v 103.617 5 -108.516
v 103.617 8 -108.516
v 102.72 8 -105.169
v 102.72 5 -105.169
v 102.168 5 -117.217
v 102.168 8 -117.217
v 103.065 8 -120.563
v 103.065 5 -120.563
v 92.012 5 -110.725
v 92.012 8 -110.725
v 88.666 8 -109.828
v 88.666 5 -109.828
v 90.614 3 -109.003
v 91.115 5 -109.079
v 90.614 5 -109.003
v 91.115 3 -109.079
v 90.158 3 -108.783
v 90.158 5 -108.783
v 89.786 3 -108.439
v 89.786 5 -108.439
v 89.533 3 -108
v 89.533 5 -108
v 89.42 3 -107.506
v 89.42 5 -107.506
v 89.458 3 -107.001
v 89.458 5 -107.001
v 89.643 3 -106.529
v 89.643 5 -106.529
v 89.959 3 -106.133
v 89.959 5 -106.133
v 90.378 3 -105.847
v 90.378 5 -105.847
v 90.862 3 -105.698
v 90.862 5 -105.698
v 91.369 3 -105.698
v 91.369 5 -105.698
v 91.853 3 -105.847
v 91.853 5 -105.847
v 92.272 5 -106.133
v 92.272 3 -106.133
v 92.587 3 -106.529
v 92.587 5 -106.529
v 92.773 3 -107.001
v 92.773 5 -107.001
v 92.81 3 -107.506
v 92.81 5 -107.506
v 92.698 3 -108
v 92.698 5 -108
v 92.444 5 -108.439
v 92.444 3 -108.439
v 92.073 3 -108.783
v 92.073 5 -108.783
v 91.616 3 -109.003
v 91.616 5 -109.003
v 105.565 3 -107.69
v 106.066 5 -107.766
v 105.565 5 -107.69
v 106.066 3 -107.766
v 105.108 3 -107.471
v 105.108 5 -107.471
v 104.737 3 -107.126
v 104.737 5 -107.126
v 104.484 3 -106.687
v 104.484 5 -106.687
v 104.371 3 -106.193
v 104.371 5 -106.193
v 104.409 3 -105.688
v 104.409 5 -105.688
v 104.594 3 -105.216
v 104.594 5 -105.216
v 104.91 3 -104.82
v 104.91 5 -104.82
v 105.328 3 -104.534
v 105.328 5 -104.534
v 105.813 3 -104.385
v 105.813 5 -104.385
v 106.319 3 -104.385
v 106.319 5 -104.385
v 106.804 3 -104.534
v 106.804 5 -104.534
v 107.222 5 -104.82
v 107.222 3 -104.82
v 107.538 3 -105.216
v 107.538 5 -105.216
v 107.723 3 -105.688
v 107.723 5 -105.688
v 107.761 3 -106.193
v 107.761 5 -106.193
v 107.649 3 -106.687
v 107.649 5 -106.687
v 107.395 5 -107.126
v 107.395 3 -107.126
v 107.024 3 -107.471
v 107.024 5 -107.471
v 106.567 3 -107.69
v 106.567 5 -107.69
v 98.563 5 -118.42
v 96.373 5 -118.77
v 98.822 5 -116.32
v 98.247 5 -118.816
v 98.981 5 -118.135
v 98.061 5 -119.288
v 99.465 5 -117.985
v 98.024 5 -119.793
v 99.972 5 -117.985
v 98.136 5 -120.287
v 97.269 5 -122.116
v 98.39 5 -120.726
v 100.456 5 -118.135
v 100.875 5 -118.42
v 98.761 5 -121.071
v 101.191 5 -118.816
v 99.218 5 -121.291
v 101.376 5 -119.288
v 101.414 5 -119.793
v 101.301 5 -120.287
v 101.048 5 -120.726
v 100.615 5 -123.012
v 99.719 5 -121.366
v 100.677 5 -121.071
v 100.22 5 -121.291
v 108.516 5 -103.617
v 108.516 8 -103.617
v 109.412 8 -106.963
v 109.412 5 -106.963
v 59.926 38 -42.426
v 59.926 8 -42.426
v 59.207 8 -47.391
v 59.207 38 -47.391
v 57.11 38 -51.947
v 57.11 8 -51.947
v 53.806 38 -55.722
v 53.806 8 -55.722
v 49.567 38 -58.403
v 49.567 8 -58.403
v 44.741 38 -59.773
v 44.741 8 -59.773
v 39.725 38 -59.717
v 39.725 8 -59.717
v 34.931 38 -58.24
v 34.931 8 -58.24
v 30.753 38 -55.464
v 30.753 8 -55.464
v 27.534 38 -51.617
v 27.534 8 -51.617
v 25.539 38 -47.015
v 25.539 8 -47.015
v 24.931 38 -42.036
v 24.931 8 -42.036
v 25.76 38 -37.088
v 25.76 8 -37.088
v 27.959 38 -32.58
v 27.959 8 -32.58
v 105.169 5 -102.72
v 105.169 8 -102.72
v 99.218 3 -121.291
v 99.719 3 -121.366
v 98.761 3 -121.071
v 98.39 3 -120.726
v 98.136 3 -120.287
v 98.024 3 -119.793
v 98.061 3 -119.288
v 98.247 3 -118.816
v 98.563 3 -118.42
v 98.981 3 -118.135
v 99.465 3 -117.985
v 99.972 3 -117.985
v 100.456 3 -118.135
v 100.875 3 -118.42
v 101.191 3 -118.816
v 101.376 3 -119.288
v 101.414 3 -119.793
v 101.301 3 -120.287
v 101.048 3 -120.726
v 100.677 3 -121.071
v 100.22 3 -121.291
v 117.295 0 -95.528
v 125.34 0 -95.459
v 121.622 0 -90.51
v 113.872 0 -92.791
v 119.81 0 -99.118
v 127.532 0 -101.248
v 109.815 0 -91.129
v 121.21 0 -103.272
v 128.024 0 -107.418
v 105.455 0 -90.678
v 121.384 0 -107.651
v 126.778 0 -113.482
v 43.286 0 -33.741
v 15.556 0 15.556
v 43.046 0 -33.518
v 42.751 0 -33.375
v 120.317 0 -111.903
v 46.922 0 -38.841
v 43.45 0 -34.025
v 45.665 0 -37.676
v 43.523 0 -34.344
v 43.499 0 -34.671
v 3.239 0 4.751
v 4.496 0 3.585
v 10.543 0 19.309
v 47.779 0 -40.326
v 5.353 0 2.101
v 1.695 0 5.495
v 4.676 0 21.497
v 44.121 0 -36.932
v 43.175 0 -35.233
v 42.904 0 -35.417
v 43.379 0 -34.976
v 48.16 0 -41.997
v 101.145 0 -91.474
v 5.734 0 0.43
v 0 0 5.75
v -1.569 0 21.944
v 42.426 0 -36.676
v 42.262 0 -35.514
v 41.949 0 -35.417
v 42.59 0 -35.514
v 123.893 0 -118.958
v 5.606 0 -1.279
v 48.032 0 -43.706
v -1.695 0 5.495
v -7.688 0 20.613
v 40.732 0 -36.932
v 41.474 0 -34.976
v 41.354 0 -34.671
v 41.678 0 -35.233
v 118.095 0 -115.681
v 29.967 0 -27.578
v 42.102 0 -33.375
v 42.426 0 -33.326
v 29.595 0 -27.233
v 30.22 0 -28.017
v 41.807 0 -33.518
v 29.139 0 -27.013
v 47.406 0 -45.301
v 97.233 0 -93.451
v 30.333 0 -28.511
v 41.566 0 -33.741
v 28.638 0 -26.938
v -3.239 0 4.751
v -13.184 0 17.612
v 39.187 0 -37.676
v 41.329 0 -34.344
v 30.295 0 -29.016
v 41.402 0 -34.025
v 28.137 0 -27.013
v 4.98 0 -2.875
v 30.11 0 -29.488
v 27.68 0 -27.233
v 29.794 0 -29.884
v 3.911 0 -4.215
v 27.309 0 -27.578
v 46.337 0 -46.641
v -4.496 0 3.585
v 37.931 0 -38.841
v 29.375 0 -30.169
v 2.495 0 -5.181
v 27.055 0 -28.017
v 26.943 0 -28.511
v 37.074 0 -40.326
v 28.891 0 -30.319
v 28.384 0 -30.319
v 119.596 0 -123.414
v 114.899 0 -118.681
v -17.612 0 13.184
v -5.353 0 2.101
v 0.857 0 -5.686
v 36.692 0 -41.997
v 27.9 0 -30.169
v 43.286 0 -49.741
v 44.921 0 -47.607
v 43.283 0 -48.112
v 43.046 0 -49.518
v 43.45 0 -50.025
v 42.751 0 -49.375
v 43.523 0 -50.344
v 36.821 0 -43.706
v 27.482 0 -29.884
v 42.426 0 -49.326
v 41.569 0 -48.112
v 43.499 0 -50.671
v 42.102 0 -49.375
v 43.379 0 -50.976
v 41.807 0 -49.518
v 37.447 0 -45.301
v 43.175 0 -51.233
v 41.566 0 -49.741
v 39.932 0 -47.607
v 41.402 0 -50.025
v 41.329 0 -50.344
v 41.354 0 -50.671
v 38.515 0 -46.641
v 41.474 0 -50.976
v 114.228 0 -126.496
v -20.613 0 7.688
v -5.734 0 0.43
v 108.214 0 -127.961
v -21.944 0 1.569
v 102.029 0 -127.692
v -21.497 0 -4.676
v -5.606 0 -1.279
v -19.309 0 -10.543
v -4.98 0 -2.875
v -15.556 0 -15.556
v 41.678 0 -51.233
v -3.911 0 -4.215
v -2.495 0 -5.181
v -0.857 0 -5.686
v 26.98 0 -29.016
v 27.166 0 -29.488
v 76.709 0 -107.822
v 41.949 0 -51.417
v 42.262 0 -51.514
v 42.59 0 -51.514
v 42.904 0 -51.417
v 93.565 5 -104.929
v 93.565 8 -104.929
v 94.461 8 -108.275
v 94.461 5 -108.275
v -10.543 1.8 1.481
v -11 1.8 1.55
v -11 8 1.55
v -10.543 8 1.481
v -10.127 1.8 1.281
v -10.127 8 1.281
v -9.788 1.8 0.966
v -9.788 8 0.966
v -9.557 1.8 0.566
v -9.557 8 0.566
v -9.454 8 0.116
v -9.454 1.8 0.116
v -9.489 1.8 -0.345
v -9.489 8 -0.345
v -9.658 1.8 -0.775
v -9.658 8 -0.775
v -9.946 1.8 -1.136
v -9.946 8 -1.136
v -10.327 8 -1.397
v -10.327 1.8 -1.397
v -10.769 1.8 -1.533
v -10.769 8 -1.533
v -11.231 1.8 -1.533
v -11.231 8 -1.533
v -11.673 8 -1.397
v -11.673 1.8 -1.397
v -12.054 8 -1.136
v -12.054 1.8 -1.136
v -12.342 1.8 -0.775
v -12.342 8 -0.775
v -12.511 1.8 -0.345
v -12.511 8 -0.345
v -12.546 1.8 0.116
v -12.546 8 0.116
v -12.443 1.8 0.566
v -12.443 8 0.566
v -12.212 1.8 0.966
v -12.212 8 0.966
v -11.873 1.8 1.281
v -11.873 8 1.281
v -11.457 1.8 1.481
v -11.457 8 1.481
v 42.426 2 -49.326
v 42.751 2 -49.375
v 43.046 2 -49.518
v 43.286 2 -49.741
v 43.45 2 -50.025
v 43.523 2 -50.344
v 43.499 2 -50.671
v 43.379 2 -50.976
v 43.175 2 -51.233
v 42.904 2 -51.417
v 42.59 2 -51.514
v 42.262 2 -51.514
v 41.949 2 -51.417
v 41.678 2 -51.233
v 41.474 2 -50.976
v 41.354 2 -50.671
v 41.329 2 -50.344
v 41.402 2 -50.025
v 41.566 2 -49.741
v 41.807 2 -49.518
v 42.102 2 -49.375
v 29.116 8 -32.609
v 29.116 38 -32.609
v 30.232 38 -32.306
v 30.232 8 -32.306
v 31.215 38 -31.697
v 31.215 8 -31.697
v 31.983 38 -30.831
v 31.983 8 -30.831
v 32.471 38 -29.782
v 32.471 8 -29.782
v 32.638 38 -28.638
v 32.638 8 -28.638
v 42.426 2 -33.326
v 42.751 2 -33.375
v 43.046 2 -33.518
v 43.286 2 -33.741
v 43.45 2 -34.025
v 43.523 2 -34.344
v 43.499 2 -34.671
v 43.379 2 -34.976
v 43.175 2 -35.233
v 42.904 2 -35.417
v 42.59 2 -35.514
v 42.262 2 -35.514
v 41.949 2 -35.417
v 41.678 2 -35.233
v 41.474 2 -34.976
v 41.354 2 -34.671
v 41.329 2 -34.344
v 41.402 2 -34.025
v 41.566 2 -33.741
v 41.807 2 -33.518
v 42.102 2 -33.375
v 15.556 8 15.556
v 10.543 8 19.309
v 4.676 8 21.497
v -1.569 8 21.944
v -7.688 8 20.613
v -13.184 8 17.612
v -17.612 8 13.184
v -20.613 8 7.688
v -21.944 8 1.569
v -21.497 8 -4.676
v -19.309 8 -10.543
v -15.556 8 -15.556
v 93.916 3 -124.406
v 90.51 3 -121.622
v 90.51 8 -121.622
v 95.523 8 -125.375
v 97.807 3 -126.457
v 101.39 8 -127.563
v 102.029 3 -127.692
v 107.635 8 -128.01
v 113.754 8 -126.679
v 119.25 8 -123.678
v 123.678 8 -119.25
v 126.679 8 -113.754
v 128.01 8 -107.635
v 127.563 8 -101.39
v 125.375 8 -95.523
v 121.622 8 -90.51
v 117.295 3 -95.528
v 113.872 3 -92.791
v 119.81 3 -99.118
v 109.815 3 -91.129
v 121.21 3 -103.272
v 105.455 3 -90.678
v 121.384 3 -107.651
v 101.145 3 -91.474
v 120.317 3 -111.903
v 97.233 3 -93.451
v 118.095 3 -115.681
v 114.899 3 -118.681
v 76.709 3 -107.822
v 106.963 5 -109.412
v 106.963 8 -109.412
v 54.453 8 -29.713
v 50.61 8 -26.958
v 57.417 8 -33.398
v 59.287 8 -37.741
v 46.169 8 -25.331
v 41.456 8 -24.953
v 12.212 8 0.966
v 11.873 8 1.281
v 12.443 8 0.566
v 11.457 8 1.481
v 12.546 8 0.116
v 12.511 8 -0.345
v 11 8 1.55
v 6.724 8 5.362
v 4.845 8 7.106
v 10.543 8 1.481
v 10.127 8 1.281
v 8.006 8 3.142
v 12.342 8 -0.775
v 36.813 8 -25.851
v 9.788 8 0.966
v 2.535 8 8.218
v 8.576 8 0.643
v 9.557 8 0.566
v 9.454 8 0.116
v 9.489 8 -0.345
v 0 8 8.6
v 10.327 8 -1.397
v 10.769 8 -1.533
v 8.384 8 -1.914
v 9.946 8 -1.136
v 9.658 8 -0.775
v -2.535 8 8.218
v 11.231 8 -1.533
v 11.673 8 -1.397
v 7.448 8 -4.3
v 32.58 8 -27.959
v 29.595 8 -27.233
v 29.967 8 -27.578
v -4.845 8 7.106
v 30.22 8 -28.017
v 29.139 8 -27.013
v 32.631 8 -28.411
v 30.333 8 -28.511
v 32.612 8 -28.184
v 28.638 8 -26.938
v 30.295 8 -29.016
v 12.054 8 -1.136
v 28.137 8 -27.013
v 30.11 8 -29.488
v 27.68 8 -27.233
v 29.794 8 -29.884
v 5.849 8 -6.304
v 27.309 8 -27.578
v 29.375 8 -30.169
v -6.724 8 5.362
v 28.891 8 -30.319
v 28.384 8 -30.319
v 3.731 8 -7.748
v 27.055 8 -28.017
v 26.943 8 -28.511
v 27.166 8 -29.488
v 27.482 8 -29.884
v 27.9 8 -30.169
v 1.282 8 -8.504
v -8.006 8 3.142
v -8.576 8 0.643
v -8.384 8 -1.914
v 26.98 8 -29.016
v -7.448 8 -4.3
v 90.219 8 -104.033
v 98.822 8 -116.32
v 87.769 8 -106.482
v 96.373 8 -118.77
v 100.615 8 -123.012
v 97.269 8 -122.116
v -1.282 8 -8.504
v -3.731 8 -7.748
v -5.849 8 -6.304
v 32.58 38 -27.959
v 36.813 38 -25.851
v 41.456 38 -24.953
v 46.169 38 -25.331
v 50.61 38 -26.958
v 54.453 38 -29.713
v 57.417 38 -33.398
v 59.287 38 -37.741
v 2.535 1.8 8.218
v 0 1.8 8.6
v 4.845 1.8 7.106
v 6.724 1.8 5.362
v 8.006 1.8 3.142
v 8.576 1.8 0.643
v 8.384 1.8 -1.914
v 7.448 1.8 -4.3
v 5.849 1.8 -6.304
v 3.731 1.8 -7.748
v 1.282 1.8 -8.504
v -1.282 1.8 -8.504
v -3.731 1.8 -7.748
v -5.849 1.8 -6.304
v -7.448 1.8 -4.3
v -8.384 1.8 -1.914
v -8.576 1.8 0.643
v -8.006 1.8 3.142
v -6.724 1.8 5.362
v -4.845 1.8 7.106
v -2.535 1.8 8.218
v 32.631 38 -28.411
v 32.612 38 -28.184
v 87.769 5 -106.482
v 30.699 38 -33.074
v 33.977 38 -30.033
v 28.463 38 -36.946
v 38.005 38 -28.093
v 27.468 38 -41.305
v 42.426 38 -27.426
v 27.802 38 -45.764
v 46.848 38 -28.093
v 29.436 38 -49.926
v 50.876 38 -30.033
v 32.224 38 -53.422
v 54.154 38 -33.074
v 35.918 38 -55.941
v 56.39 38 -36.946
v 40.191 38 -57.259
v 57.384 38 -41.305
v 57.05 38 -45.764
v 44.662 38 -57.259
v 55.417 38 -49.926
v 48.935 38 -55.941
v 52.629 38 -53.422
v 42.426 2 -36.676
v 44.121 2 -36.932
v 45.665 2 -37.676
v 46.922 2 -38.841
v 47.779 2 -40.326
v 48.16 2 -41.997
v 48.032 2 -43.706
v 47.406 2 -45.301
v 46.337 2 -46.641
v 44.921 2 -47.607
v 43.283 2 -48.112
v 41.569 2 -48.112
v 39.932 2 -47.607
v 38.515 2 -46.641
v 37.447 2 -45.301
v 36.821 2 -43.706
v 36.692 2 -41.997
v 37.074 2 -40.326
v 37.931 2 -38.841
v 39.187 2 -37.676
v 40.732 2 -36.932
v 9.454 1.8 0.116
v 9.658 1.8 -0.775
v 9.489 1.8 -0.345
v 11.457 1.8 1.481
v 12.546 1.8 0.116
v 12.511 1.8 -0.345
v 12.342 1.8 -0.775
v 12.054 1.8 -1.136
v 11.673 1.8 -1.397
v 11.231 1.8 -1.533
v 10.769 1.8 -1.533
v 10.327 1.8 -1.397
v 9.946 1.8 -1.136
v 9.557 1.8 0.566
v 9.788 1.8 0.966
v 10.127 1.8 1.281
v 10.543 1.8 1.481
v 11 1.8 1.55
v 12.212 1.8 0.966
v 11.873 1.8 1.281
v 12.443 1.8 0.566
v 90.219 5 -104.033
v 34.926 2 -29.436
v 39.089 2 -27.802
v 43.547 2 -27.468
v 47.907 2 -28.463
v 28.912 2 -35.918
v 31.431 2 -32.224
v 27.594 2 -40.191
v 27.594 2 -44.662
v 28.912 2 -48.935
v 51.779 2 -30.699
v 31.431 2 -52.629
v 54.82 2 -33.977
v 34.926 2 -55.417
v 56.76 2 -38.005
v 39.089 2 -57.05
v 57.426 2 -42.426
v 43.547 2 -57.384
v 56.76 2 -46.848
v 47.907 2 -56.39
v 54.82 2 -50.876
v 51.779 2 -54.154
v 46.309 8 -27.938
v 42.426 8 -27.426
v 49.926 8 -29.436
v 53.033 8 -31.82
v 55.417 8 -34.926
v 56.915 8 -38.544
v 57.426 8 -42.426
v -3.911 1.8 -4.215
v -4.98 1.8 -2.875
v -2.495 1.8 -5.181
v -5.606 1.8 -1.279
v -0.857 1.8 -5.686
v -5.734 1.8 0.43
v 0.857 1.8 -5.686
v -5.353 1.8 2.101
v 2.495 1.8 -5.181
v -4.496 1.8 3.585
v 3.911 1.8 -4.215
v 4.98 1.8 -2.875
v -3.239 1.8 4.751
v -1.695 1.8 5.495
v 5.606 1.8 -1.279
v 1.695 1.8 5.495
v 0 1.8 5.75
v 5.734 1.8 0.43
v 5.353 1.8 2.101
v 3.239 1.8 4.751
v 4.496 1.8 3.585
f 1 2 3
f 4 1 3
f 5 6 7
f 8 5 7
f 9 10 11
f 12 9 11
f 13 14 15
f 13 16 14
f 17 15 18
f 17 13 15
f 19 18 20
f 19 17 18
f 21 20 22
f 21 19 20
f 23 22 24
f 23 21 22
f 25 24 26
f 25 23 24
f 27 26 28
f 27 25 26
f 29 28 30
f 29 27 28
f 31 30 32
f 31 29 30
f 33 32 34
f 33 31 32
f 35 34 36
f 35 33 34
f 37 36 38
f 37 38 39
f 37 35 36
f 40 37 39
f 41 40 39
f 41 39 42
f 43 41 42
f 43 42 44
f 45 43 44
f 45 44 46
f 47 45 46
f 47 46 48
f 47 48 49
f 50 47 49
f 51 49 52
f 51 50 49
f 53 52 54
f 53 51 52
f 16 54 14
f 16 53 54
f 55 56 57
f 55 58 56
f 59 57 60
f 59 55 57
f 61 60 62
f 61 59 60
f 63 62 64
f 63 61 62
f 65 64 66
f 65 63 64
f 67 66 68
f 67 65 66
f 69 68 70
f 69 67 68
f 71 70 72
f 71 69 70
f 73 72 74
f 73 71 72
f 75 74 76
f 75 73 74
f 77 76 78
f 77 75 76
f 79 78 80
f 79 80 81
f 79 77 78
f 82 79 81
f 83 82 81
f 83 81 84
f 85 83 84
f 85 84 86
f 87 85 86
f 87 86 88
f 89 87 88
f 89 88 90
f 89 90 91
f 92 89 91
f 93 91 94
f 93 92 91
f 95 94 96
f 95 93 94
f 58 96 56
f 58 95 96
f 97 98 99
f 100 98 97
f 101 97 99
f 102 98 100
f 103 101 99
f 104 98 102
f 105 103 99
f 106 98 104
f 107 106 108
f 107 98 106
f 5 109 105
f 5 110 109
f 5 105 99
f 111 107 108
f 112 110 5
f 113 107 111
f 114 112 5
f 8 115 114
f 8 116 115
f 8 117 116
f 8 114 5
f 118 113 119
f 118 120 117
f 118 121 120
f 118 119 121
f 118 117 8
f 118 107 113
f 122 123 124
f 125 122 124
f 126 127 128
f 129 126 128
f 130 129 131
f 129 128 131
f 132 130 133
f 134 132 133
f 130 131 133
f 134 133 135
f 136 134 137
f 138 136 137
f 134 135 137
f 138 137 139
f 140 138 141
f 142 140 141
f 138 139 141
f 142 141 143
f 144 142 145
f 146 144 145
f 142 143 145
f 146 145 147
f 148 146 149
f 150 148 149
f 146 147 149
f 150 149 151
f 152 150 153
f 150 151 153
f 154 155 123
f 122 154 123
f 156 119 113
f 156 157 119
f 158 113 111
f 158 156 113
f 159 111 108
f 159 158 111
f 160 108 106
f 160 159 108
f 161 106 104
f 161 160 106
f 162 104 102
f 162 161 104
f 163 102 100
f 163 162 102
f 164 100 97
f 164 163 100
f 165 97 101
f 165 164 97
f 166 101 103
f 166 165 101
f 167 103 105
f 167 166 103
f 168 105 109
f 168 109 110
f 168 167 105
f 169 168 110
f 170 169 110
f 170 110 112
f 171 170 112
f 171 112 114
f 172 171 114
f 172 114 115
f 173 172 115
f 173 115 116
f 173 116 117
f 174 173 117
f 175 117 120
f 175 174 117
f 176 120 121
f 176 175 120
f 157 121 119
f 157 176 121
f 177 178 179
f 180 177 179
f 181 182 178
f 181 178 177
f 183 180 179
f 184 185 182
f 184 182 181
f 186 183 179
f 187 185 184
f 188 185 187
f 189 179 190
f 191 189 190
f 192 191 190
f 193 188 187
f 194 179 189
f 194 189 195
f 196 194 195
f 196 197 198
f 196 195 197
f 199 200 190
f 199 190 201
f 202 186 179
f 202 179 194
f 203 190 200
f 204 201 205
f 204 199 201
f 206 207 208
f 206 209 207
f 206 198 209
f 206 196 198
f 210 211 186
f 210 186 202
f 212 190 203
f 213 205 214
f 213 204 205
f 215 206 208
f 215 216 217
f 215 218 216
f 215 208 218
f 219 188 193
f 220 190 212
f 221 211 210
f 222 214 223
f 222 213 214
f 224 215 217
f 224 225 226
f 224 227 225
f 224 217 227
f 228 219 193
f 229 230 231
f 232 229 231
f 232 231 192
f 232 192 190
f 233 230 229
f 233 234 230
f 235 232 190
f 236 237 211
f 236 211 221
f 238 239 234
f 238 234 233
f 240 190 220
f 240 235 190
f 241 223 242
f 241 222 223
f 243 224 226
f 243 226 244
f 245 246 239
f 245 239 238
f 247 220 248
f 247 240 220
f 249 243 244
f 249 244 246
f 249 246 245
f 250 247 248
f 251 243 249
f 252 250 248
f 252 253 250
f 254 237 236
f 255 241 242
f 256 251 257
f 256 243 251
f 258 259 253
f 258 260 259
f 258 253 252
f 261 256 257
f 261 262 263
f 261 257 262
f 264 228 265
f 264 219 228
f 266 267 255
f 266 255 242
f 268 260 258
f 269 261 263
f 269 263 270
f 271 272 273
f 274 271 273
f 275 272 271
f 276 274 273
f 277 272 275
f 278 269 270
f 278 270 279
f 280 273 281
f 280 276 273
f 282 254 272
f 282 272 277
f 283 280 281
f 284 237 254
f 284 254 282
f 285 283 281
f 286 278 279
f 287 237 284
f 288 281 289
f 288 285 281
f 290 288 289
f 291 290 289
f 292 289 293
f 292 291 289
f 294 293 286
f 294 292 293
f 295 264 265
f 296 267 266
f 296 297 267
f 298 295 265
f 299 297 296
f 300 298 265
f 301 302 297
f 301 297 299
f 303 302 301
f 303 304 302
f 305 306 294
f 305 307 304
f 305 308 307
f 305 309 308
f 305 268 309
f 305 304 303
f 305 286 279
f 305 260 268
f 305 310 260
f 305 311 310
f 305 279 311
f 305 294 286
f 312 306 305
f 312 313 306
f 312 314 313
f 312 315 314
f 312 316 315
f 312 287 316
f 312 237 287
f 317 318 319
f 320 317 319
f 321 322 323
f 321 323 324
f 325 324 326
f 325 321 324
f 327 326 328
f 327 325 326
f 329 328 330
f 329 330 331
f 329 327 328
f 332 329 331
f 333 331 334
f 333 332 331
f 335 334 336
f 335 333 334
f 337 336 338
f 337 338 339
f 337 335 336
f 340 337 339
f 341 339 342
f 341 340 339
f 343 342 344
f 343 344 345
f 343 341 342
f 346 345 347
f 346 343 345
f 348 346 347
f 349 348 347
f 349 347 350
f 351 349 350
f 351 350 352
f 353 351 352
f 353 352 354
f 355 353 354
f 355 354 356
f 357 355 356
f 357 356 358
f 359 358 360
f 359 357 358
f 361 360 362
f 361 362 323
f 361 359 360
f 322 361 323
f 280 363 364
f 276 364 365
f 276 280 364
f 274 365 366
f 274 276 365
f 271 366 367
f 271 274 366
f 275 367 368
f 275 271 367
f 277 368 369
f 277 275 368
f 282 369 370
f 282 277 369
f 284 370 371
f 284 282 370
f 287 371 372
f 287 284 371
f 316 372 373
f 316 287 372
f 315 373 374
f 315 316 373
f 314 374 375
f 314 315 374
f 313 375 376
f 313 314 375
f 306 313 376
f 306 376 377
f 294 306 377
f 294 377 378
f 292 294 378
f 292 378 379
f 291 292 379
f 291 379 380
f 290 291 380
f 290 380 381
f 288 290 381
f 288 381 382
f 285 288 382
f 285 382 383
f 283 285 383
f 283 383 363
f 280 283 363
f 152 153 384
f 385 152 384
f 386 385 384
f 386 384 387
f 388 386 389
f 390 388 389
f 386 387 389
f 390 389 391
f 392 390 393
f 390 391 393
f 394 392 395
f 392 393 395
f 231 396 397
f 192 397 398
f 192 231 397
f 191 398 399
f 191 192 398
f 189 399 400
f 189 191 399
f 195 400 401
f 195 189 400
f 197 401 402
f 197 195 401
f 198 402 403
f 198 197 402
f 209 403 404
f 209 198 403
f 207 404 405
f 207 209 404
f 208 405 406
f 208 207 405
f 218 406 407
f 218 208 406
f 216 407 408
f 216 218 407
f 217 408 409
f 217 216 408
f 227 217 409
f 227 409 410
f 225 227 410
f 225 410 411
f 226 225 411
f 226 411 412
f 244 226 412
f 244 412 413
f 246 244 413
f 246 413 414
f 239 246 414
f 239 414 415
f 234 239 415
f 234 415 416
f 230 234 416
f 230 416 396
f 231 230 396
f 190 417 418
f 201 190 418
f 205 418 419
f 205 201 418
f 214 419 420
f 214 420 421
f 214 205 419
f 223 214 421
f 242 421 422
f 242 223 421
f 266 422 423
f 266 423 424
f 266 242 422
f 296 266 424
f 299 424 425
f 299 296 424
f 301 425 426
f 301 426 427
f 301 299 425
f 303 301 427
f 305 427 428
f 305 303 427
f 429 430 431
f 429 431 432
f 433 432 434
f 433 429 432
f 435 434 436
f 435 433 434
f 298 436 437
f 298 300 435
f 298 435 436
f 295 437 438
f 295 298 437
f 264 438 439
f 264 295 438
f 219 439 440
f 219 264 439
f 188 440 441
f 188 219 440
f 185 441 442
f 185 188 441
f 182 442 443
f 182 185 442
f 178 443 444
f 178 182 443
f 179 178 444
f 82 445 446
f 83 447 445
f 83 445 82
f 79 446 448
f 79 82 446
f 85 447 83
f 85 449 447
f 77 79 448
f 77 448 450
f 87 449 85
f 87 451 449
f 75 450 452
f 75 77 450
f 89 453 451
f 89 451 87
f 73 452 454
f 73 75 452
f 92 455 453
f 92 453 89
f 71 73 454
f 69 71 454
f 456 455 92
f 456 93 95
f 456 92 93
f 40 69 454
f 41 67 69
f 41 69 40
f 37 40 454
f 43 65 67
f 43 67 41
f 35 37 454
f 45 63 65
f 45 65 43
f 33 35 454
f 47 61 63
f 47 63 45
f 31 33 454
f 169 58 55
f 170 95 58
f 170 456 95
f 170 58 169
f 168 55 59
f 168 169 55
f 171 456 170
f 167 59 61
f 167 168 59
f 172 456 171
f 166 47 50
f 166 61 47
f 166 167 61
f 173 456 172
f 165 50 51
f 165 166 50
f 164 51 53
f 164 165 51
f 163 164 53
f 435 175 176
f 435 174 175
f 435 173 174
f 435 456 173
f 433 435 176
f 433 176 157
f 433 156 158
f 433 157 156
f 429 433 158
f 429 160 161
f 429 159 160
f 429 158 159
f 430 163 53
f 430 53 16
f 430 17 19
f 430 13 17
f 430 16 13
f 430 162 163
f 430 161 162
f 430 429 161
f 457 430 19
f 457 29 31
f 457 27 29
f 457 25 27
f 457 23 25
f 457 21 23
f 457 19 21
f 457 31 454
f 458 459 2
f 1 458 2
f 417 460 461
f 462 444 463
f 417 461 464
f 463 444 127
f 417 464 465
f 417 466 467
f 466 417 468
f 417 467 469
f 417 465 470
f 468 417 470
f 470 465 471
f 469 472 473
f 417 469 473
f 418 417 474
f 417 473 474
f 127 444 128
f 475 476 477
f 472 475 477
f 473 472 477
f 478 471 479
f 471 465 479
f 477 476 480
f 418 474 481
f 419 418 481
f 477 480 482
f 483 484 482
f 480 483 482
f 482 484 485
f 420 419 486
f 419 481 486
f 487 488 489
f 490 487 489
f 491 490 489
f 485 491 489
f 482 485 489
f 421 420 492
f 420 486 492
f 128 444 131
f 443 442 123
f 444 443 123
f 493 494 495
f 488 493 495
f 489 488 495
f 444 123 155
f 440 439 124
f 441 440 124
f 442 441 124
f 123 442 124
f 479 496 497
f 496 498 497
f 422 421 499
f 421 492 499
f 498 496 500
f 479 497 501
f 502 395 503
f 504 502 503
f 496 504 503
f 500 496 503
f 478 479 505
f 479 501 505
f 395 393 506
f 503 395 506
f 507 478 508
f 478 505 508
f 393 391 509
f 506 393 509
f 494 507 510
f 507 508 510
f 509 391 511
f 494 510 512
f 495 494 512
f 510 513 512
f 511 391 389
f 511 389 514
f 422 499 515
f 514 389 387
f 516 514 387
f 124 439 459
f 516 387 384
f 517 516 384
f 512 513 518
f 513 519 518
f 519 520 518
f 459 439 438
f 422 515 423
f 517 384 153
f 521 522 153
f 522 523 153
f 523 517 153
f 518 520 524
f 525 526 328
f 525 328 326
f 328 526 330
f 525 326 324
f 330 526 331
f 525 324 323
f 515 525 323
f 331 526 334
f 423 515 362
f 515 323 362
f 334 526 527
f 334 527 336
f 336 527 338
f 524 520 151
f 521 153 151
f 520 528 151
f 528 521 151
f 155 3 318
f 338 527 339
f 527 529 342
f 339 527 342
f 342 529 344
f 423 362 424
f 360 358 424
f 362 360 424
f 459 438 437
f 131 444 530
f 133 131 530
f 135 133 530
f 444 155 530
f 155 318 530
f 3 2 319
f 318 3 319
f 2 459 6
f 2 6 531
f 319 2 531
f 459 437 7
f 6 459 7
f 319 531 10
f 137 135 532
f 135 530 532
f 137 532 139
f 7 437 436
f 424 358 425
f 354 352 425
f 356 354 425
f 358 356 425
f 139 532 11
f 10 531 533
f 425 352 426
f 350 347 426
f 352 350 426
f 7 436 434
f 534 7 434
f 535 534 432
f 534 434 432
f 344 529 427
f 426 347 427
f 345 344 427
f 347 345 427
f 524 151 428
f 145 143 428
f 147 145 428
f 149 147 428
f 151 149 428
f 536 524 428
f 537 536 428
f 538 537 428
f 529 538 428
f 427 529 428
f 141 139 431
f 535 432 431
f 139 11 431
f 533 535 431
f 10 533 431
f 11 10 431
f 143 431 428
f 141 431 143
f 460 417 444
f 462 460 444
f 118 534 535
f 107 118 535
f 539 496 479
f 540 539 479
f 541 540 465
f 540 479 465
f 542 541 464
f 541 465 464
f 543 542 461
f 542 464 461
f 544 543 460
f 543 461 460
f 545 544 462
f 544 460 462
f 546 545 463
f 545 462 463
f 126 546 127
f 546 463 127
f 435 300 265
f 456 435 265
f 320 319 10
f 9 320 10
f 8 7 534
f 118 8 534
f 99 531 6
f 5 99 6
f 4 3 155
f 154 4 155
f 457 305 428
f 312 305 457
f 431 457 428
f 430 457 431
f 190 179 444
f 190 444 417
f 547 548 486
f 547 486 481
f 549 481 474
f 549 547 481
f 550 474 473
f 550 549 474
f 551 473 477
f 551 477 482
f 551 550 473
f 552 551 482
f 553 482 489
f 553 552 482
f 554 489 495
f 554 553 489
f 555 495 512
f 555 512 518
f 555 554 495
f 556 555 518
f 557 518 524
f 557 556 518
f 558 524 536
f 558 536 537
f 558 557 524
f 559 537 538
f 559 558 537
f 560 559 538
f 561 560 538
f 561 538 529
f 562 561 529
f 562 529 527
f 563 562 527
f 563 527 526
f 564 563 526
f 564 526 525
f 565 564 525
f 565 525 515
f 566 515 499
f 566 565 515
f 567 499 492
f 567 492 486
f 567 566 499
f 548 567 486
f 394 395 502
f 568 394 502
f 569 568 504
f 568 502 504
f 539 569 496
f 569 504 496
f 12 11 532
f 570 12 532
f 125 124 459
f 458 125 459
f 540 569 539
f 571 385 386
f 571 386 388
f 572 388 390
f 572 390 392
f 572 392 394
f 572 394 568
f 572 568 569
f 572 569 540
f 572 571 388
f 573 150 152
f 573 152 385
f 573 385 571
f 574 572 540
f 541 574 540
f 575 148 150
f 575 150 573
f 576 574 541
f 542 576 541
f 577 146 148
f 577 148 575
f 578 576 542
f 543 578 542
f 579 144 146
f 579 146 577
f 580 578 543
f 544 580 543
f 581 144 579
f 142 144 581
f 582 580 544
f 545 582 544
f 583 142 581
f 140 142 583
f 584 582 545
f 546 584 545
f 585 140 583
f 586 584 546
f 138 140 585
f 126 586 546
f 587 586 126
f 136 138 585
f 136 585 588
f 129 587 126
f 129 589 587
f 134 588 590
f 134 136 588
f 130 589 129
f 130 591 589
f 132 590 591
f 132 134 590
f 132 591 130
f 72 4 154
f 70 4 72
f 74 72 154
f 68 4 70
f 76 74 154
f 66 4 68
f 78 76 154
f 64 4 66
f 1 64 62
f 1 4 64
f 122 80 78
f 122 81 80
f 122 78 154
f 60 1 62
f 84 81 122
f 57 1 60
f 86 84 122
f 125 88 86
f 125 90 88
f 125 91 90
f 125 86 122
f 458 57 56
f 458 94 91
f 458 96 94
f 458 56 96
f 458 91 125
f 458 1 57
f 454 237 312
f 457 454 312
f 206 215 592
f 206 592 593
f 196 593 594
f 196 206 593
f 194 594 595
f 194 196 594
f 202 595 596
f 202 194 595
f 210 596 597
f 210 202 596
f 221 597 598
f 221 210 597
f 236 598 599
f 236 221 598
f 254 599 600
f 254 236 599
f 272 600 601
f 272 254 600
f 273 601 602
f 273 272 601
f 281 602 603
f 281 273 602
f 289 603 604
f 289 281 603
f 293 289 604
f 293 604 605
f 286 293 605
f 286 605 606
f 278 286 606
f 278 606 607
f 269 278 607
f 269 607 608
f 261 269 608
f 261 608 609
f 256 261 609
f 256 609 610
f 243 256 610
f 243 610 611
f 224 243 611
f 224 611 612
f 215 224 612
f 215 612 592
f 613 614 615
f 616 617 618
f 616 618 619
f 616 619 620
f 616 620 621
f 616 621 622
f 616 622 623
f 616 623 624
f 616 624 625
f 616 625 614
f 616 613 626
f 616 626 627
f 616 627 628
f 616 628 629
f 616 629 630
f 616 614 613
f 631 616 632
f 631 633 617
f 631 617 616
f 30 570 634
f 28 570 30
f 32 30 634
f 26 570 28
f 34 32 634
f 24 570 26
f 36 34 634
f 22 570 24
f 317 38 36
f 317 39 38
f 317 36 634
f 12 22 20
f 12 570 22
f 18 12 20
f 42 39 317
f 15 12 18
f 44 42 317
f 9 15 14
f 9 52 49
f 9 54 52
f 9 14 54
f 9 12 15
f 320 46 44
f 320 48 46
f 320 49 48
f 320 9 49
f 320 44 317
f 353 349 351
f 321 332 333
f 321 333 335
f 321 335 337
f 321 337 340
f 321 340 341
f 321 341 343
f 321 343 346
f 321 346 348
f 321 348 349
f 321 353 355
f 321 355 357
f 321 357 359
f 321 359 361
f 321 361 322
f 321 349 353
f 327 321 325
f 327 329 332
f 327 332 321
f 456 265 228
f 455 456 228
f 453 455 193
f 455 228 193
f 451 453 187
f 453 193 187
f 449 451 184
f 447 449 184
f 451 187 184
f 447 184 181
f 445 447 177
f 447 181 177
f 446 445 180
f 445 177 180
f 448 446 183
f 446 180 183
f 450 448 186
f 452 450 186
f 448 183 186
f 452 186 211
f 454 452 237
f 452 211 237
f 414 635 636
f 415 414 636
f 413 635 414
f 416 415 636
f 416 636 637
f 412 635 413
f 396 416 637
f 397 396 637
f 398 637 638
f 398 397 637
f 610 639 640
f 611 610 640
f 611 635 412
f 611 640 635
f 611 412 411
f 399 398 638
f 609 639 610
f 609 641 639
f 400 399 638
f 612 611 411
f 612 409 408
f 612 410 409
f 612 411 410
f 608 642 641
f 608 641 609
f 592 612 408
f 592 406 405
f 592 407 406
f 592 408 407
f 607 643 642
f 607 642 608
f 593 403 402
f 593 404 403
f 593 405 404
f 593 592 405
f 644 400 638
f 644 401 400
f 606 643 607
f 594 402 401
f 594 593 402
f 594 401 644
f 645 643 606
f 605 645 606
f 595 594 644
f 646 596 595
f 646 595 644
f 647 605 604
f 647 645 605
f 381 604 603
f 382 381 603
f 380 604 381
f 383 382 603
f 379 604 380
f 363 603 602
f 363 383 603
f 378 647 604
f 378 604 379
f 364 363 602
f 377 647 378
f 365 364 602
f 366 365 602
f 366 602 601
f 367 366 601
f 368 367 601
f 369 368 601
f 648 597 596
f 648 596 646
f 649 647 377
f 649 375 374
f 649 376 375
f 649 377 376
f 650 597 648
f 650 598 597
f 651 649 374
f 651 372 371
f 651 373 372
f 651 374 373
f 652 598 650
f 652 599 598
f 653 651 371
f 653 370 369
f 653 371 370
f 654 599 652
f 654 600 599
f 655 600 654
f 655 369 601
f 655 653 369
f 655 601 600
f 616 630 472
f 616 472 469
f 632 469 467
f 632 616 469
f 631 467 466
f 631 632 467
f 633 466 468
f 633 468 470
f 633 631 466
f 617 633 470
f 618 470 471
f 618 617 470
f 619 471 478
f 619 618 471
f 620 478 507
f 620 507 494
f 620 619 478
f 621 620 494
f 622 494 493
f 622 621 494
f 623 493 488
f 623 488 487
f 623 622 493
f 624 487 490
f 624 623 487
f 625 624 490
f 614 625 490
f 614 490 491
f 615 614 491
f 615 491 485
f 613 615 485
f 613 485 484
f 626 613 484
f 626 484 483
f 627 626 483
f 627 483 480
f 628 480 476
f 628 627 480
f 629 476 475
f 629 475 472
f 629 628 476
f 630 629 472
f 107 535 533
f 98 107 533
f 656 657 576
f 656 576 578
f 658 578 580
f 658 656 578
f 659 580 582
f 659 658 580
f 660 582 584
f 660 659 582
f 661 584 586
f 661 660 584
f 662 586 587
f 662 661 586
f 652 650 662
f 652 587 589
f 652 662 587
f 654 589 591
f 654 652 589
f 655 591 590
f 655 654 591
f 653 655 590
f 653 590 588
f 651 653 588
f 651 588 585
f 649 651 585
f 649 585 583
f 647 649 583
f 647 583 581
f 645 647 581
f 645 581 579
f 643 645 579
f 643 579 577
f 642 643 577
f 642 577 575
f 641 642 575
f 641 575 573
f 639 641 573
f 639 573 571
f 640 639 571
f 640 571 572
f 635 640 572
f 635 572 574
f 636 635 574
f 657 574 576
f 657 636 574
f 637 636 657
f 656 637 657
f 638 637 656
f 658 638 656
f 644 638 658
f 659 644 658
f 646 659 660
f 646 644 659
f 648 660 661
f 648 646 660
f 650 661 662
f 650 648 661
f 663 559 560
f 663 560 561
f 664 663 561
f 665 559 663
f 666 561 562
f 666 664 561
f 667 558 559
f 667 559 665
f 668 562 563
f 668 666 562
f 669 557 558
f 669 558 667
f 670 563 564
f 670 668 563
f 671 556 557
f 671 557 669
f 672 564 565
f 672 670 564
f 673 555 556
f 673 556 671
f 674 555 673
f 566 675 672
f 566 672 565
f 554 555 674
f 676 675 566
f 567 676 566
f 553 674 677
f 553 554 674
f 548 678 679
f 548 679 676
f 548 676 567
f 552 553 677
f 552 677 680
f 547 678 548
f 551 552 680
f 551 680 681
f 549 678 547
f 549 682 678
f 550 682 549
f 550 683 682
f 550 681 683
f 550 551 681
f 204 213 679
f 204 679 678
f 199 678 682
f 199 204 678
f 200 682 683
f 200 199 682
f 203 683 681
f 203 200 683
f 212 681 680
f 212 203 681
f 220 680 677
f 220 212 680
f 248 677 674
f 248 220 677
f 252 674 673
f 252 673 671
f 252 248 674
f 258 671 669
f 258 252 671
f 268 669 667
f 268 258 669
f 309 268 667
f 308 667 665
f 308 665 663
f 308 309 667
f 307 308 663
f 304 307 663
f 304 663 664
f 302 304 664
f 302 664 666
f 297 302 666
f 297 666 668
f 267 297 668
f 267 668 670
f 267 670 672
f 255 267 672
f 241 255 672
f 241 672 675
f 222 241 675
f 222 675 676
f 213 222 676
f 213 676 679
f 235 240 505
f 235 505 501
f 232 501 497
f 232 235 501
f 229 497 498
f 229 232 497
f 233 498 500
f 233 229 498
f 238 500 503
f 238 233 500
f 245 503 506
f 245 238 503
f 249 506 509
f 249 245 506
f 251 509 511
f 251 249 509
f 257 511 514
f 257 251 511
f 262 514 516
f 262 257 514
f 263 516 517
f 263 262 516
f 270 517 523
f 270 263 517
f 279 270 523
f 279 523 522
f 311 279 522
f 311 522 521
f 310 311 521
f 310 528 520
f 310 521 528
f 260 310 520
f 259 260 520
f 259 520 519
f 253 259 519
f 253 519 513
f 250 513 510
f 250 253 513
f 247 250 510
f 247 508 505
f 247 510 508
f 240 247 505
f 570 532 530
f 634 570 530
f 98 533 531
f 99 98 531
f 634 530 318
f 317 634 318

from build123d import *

# Parameters (mm, degrees)
BOSS_EXTRUDE1_DEPTH       = 8
BOSS_EXTRUDE3_START       = 8
SKETCH4_R                 = 15
BOSS_EXTRUDE3_DEPTH       = 30
CUT_EXTRUDE9_DEPTH        = 186.056233377
CUT_EXTRUDE9_DEPTH_BACK   = 186.056233377
SKETCH4_5_R               = 5.75
SKETCH4_5_R_2             = 1.1
SKETCH4_5_R_3             = 1.7
CUT_EXTRUDE5_START        = 8
SKETCH1_8_R               = 1.7
CUT_EXTRUDE5_DEPTH        = 3
CUT_EXTRUDE6_DEPTH        = 3
CUT_EXTRUDE11_START       = 1.8
SKETCH4_7_R               = 8.6
SKETCH4_7_R_2             = 5.75
SKETCH4_7_R_3             = 1.55
CUT_EXTRUDE11_DEPTH       = 6.2
CUT_EXTRUDE13_DEPTH       = 186.056233377
CUT_EXTRUDE13_DEPTH_BACK  = 186.056233377
SKETCH1_10_R              = 1.7
CUT_EXTRUDE14_START       = 2
CUT_EXTRUDE14_OUTLINE_R   = 15
CUT_EXTRUDE14_OUTLINE_R_2 = 1.1
CUT_EXTRUDE14_OUTLINE_R_3 = 5.75
CUT_EXTRUDE14_DEPTH       = 6


# Read off the part's stored shape, not the designer's step: Cut-Extrude14
with BuildPart() as part:
    # Sketch1 → Boss-Extrude1 (new body)
    with BuildSketch(Plane(origin=(0, 0, 0), x_dir=(1, 0, 0), z_dir=(0, 1, 0))):
        with BuildLine():
            Line((-15.556349186, 15.556349186), (90.509667992, 121.622366364))
            ThreePointArc((90.509667992, 121.622366364), (121.622366364, 121.622366364), (121.622366364, 90.509667992))
            Line((121.622366364, 90.509667992), (15.556349186, -15.556349186))
            ThreePointArc((15.556349186, -15.556349186), (-15.556349186, -15.556349186), (-15.556349186, 15.556349186))
        make_face()
    extrude(amount=BOSS_EXTRUDE1_DEPTH)

    # Sketch4 → Boss-Extrude3 (add)
    with BuildSketch(Plane(origin=(0, 0, 0), x_dir=(1, 0, 0), z_dir=(0, 1, 0)).offset(BOSS_EXTRUDE3_START)):
        with BuildLine():
            ThreePointArc((32.579864505, 27.95935453), (50.609789686, 26.957656252), (59.926406871, 42.426406871))
            ThreePointArc((59.926406871, 42.426406871), (37.274873894, 59.150990812), (27.95935453, 32.579864505))
            ThreePointArc((27.95935453, 32.579864505), (31.215238028, 31.696736244), (32.637824638, 28.637824638))
            ThreePointArc((32.637824638, 28.637824638), (32.623308264, 28.297353984), (32.579864505, 27.95935453))
        make_face()
        with Locations(Location((42.426406871, 42.426406871, 0), (0, 0, 270))):
            Circle(SKETCH4_R, mode=Mode.SUBTRACT)
    extrude(amount=BOSS_EXTRUDE3_DEPTH)

    # Sketch4<5> → Cut-Extrude9 (cut, two sides: drawn at the far end of the back side and taken through both)
    with BuildSketch(Plane(origin=(0, 0, 0), x_dir=(1, 0, 0), z_dir=(0, 1, 0)).offset(-CUT_EXTRUDE9_DEPTH_BACK)):
        with Locations(Location((0, 0, 0), (0, 0, 270))):
            Circle(SKETCH4_5_R)
        with Locations(Location((42.426406871, 42.426406871, 0), (0, 0, 270))):
            Circle(SKETCH4_5_R)
        with Locations(Location((42.426406871, 50.426406871, 0), (0, 0, 270))):
            Circle(SKETCH4_5_R_2)
        with Locations(Location((42.426406871, 34.426406871, 0), (0, 0, 270))):
            Circle(SKETCH4_5_R_2)
        with Locations(Location((28.637824638, 28.637824638, 0), (0, 0, 270))):
            Circle(SKETCH4_5_R_3)
    extrude(amount=CUT_EXTRUDE9_DEPTH + CUT_EXTRUDE9_DEPTH_BACK, mode=Mode.SUBTRACT)

    # Sketch1<8> → Cut-Extrude5 (cut)
    # profile 1 of 3: a face of its own
    with BuildSketch(Plane(origin=(0, 0, 0), x_dir=(1, 0, 0), z_dir=(0, 1, 0)).offset(CUT_EXTRUDE5_START)):
        Polygon((102.168353618, 117.21666144), (103.06492909, 120.562726655), (100.615439347, 123.012216398), (97.269374132, 122.115640925), (96.37279866, 118.769575711), (98.822288403, 116.320085968), align=None)
        with Locations(Location((99.718863875, 119.666151183, 0), (0, 0, 270))):
            Circle(SKETCH1_8_R, mode=Mode.SUBTRACT)
    # profile 2 of 3: a face of its own
    with BuildSketch(Plane(origin=(0, 0, 0), x_dir=(1, 0, 0), z_dir=(0, 1, 0)).offset(CUT_EXTRUDE5_START)):
        Polygon((88.665727587, 109.828360261), (87.769152115, 106.482295046), (90.218641857, 104.032805303), (93.564707072, 104.929380776), (94.461282545, 108.275445991), (92.011792802, 110.724935733), align=None)
        with Locations(Location((91.11521733, 107.378870518, 0), (0, 0, 270))):
            Circle(SKETCH1_8_R, mode=Mode.SUBTRACT)
    # profile 3 of 3: a face of its own
    with BuildSketch(Plane(origin=(0, 0, 0), x_dir=(1, 0, 0), z_dir=(0, 1, 0)).offset(CUT_EXTRUDE5_START)):
        Polygon((108.515506921, 103.616527435), (109.412082393, 106.96259265), (106.96259265, 109.412082393), (103.616527435, 108.515506921), (102.719951963, 105.169441706), (105.169441706, 102.719951963), align=None)
        with Locations(Location((106.066017178, 106.066017178, 0), (0, 0, 270))):
            Circle(SKETCH1_8_R, mode=Mode.SUBTRACT)
    extrude(amount=-CUT_EXTRUDE5_DEPTH, mode=Mode.SUBTRACT)

    # Sketch1<9> → Cut-Extrude6 (cut)
    with BuildSketch(Plane(origin=(0, 0, 0), x_dir=(1, 0, 0), z_dir=(0, 1, 0))):
        with BuildLine():
            Line((97.232940058, 93.451075696), (-12.006422067, 169.941300525))
            ThreePointArc((-12.006422067, 169.941300525), (-15.788286429, 191.389319127), (5.659732173, 195.171183489))
            Line((5.659732173, 195.171183489), (114.899094298, 118.68095866))
            ThreePointArc((114.899094298, 118.68095866), (118.68095866, 97.232940058), (97.232940058, 93.451075696))
        make_face()
    extrude(amount=CUT_EXTRUDE6_DEPTH, mode=Mode.SUBTRACT)

    # Sketch4<7> → Cut-Extrude11 (cut)
    # profile 1 of 3: a face of its own
    with BuildSketch(Plane(origin=(0, 0, 0), x_dir=(1, 0, 0), z_dir=(0, 1, 0)).offset(CUT_EXTRUDE11_START)):
        with Locations(Location((0, 0, 0), (0, 0, 270))):
            Circle(SKETCH4_7_R)
        with Locations(Location((0, 0, 0), (0, 0, 270))):
            Circle(SKETCH4_7_R_2, mode=Mode.SUBTRACT)
    # profile 2 of 3: a face of its own
    with BuildSketch(Plane(origin=(0, 0, 0), x_dir=(1, 0, 0), z_dir=(0, 1, 0)).offset(CUT_EXTRUDE11_START)):
        with Locations(Location((11, 0, 0), (0, 0, 270))):
            Circle(SKETCH4_7_R_3)
    # profile 3 of 3: a face of its own
    with BuildSketch(Plane(origin=(0, 0, 0), x_dir=(1, 0, 0), z_dir=(0, 1, 0)).offset(CUT_EXTRUDE11_START)):
        with Locations(Location((-11, 0, 0), (0, 0, 270))):
            Circle(SKETCH4_7_R_3)
    extrude(amount=CUT_EXTRUDE11_DEPTH, mode=Mode.SUBTRACT)

    # Sketch1<10> → Cut-Extrude13 (cut, two sides: drawn at the far end of the back side and taken through both)
    with BuildSketch(Plane(origin=(0, 0, 0), x_dir=(1, 0, 0), z_dir=(0, 1, 0)).offset(-CUT_EXTRUDE13_DEPTH_BACK)):
        with Locations(Location((99.718863875, 119.666151183, 0), (0, 0, 90))):
            Circle(SKETCH1_10_R)
        with Locations(Location((91.11521733, 107.378870518, 0), (0, 0, 90))):
            Circle(SKETCH1_10_R)
        with Locations(Location((106.066017178, 106.066017178, 0), (0, 0, 90))):
            Circle(SKETCH1_10_R)
    extrude(amount=CUT_EXTRUDE13_DEPTH + CUT_EXTRUDE13_DEPTH_BACK, mode=Mode.SUBTRACT)

    # Cut-Extrude14 outline → Cut-Extrude14 (cut)
    with BuildSketch(Plane(origin=(0, 0, 0), x_dir=(1, 0, 0), z_dir=(0, 1, 0)).offset(CUT_EXTRUDE14_START)):
        with Locations((42.426406871, 42.426406871)):
            Circle(CUT_EXTRUDE14_OUTLINE_R)
        with Locations((42.426406871, 34.426406871)):
            Circle(CUT_EXTRUDE14_OUTLINE_R_2, mode=Mode.SUBTRACT)
        with Locations((42.426406871, 42.426406871)):
            Circle(CUT_EXTRUDE14_OUTLINE_R_3, mode=Mode.SUBTRACT)
        with Locations((42.426406871, 50.426406871)):
            Circle(CUT_EXTRUDE14_OUTLINE_R_2, mode=Mode.SUBTRACT)
    extrude(amount=CUT_EXTRUDE14_DEPTH, mode=Mode.SUBTRACT)


solid = part.part
